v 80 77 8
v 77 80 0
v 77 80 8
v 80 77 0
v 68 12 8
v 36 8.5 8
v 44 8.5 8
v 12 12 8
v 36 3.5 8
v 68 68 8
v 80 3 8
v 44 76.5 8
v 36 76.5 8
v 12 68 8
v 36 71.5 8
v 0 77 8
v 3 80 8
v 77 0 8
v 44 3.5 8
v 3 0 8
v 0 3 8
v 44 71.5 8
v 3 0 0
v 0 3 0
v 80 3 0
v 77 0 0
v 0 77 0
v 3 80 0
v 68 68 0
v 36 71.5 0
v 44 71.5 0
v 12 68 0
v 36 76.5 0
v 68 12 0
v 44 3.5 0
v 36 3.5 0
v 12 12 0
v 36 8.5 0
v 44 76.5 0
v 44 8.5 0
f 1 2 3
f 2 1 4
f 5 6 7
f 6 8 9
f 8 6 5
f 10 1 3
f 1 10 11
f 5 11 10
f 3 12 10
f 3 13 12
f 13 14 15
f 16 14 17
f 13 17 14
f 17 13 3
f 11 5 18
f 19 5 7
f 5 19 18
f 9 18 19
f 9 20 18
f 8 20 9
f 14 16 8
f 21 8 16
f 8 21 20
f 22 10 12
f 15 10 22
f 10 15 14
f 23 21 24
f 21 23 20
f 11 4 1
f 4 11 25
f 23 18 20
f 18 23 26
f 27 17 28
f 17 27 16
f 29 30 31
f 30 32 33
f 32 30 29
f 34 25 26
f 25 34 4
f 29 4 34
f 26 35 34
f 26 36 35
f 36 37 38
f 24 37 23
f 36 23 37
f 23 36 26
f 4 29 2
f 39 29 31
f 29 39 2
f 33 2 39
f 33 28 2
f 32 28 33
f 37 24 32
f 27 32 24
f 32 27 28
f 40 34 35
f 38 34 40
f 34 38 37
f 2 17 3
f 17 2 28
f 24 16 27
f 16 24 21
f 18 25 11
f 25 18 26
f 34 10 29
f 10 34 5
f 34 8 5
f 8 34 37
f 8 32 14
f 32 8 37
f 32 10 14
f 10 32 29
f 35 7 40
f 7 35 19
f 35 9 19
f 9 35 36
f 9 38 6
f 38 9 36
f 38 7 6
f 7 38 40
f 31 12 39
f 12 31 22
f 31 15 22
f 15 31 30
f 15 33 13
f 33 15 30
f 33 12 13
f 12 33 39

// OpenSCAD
$fn = 32;

// ----------------------------------------------------------------------
// Frame plate: 80 x 80 frame, 12 mm rails
// ----------------------------------------------------------------------

// --- parameters (mm) ---
plate_l = 80;             // plate length, X
plate_w = 80;             // plate width, Y
plate_t = 8;              // plate thickness, Z (extrusion height)
corner_c = 3;             // corner chamfer
frame_bar = 12;           // frame rail width
slot_l = 8;               // adjustment slot length
slot_w = 5;               // adjustment slot width

win_l = plate_l - 2 * frame_bar;  // window length
win_w = plate_w - 2 * frame_bar;  // window width

profile = [[3, 0], [77, 0], [80, 3], [80, 77], [77, 80], [3, 80], [0, 77], [0, 3]];  // primary outline, 8 points, counter clockwise
void_1 = [[12, 12], [68, 12], [68, 68], [12, 68]];  // the window, 4 points
void_2 = [[36, 3.5], [44, 3.5], [44, 8.5], [36, 8.5]];  // adjustment slot, 4 points
void_3 = [[36, 71.5], [44, 71.5], [44, 76.5], [36, 76.5]];  // adjustment slot, 4 points

// --- the one profile operation ---
difference() {
  linear_extrude(height = plate_t) polygon(points = profile);
  translate([0, 0, -1])
    linear_extrude(height = plate_t + 2) polygon(points = void_1);
  translate([0, 0, -1])
    linear_extrude(height = plate_t + 2) polygon(points = void_2);
  translate([0, 0, -1])
    linear_extrude(height = plate_t + 2) polygon(points = void_3);
}
